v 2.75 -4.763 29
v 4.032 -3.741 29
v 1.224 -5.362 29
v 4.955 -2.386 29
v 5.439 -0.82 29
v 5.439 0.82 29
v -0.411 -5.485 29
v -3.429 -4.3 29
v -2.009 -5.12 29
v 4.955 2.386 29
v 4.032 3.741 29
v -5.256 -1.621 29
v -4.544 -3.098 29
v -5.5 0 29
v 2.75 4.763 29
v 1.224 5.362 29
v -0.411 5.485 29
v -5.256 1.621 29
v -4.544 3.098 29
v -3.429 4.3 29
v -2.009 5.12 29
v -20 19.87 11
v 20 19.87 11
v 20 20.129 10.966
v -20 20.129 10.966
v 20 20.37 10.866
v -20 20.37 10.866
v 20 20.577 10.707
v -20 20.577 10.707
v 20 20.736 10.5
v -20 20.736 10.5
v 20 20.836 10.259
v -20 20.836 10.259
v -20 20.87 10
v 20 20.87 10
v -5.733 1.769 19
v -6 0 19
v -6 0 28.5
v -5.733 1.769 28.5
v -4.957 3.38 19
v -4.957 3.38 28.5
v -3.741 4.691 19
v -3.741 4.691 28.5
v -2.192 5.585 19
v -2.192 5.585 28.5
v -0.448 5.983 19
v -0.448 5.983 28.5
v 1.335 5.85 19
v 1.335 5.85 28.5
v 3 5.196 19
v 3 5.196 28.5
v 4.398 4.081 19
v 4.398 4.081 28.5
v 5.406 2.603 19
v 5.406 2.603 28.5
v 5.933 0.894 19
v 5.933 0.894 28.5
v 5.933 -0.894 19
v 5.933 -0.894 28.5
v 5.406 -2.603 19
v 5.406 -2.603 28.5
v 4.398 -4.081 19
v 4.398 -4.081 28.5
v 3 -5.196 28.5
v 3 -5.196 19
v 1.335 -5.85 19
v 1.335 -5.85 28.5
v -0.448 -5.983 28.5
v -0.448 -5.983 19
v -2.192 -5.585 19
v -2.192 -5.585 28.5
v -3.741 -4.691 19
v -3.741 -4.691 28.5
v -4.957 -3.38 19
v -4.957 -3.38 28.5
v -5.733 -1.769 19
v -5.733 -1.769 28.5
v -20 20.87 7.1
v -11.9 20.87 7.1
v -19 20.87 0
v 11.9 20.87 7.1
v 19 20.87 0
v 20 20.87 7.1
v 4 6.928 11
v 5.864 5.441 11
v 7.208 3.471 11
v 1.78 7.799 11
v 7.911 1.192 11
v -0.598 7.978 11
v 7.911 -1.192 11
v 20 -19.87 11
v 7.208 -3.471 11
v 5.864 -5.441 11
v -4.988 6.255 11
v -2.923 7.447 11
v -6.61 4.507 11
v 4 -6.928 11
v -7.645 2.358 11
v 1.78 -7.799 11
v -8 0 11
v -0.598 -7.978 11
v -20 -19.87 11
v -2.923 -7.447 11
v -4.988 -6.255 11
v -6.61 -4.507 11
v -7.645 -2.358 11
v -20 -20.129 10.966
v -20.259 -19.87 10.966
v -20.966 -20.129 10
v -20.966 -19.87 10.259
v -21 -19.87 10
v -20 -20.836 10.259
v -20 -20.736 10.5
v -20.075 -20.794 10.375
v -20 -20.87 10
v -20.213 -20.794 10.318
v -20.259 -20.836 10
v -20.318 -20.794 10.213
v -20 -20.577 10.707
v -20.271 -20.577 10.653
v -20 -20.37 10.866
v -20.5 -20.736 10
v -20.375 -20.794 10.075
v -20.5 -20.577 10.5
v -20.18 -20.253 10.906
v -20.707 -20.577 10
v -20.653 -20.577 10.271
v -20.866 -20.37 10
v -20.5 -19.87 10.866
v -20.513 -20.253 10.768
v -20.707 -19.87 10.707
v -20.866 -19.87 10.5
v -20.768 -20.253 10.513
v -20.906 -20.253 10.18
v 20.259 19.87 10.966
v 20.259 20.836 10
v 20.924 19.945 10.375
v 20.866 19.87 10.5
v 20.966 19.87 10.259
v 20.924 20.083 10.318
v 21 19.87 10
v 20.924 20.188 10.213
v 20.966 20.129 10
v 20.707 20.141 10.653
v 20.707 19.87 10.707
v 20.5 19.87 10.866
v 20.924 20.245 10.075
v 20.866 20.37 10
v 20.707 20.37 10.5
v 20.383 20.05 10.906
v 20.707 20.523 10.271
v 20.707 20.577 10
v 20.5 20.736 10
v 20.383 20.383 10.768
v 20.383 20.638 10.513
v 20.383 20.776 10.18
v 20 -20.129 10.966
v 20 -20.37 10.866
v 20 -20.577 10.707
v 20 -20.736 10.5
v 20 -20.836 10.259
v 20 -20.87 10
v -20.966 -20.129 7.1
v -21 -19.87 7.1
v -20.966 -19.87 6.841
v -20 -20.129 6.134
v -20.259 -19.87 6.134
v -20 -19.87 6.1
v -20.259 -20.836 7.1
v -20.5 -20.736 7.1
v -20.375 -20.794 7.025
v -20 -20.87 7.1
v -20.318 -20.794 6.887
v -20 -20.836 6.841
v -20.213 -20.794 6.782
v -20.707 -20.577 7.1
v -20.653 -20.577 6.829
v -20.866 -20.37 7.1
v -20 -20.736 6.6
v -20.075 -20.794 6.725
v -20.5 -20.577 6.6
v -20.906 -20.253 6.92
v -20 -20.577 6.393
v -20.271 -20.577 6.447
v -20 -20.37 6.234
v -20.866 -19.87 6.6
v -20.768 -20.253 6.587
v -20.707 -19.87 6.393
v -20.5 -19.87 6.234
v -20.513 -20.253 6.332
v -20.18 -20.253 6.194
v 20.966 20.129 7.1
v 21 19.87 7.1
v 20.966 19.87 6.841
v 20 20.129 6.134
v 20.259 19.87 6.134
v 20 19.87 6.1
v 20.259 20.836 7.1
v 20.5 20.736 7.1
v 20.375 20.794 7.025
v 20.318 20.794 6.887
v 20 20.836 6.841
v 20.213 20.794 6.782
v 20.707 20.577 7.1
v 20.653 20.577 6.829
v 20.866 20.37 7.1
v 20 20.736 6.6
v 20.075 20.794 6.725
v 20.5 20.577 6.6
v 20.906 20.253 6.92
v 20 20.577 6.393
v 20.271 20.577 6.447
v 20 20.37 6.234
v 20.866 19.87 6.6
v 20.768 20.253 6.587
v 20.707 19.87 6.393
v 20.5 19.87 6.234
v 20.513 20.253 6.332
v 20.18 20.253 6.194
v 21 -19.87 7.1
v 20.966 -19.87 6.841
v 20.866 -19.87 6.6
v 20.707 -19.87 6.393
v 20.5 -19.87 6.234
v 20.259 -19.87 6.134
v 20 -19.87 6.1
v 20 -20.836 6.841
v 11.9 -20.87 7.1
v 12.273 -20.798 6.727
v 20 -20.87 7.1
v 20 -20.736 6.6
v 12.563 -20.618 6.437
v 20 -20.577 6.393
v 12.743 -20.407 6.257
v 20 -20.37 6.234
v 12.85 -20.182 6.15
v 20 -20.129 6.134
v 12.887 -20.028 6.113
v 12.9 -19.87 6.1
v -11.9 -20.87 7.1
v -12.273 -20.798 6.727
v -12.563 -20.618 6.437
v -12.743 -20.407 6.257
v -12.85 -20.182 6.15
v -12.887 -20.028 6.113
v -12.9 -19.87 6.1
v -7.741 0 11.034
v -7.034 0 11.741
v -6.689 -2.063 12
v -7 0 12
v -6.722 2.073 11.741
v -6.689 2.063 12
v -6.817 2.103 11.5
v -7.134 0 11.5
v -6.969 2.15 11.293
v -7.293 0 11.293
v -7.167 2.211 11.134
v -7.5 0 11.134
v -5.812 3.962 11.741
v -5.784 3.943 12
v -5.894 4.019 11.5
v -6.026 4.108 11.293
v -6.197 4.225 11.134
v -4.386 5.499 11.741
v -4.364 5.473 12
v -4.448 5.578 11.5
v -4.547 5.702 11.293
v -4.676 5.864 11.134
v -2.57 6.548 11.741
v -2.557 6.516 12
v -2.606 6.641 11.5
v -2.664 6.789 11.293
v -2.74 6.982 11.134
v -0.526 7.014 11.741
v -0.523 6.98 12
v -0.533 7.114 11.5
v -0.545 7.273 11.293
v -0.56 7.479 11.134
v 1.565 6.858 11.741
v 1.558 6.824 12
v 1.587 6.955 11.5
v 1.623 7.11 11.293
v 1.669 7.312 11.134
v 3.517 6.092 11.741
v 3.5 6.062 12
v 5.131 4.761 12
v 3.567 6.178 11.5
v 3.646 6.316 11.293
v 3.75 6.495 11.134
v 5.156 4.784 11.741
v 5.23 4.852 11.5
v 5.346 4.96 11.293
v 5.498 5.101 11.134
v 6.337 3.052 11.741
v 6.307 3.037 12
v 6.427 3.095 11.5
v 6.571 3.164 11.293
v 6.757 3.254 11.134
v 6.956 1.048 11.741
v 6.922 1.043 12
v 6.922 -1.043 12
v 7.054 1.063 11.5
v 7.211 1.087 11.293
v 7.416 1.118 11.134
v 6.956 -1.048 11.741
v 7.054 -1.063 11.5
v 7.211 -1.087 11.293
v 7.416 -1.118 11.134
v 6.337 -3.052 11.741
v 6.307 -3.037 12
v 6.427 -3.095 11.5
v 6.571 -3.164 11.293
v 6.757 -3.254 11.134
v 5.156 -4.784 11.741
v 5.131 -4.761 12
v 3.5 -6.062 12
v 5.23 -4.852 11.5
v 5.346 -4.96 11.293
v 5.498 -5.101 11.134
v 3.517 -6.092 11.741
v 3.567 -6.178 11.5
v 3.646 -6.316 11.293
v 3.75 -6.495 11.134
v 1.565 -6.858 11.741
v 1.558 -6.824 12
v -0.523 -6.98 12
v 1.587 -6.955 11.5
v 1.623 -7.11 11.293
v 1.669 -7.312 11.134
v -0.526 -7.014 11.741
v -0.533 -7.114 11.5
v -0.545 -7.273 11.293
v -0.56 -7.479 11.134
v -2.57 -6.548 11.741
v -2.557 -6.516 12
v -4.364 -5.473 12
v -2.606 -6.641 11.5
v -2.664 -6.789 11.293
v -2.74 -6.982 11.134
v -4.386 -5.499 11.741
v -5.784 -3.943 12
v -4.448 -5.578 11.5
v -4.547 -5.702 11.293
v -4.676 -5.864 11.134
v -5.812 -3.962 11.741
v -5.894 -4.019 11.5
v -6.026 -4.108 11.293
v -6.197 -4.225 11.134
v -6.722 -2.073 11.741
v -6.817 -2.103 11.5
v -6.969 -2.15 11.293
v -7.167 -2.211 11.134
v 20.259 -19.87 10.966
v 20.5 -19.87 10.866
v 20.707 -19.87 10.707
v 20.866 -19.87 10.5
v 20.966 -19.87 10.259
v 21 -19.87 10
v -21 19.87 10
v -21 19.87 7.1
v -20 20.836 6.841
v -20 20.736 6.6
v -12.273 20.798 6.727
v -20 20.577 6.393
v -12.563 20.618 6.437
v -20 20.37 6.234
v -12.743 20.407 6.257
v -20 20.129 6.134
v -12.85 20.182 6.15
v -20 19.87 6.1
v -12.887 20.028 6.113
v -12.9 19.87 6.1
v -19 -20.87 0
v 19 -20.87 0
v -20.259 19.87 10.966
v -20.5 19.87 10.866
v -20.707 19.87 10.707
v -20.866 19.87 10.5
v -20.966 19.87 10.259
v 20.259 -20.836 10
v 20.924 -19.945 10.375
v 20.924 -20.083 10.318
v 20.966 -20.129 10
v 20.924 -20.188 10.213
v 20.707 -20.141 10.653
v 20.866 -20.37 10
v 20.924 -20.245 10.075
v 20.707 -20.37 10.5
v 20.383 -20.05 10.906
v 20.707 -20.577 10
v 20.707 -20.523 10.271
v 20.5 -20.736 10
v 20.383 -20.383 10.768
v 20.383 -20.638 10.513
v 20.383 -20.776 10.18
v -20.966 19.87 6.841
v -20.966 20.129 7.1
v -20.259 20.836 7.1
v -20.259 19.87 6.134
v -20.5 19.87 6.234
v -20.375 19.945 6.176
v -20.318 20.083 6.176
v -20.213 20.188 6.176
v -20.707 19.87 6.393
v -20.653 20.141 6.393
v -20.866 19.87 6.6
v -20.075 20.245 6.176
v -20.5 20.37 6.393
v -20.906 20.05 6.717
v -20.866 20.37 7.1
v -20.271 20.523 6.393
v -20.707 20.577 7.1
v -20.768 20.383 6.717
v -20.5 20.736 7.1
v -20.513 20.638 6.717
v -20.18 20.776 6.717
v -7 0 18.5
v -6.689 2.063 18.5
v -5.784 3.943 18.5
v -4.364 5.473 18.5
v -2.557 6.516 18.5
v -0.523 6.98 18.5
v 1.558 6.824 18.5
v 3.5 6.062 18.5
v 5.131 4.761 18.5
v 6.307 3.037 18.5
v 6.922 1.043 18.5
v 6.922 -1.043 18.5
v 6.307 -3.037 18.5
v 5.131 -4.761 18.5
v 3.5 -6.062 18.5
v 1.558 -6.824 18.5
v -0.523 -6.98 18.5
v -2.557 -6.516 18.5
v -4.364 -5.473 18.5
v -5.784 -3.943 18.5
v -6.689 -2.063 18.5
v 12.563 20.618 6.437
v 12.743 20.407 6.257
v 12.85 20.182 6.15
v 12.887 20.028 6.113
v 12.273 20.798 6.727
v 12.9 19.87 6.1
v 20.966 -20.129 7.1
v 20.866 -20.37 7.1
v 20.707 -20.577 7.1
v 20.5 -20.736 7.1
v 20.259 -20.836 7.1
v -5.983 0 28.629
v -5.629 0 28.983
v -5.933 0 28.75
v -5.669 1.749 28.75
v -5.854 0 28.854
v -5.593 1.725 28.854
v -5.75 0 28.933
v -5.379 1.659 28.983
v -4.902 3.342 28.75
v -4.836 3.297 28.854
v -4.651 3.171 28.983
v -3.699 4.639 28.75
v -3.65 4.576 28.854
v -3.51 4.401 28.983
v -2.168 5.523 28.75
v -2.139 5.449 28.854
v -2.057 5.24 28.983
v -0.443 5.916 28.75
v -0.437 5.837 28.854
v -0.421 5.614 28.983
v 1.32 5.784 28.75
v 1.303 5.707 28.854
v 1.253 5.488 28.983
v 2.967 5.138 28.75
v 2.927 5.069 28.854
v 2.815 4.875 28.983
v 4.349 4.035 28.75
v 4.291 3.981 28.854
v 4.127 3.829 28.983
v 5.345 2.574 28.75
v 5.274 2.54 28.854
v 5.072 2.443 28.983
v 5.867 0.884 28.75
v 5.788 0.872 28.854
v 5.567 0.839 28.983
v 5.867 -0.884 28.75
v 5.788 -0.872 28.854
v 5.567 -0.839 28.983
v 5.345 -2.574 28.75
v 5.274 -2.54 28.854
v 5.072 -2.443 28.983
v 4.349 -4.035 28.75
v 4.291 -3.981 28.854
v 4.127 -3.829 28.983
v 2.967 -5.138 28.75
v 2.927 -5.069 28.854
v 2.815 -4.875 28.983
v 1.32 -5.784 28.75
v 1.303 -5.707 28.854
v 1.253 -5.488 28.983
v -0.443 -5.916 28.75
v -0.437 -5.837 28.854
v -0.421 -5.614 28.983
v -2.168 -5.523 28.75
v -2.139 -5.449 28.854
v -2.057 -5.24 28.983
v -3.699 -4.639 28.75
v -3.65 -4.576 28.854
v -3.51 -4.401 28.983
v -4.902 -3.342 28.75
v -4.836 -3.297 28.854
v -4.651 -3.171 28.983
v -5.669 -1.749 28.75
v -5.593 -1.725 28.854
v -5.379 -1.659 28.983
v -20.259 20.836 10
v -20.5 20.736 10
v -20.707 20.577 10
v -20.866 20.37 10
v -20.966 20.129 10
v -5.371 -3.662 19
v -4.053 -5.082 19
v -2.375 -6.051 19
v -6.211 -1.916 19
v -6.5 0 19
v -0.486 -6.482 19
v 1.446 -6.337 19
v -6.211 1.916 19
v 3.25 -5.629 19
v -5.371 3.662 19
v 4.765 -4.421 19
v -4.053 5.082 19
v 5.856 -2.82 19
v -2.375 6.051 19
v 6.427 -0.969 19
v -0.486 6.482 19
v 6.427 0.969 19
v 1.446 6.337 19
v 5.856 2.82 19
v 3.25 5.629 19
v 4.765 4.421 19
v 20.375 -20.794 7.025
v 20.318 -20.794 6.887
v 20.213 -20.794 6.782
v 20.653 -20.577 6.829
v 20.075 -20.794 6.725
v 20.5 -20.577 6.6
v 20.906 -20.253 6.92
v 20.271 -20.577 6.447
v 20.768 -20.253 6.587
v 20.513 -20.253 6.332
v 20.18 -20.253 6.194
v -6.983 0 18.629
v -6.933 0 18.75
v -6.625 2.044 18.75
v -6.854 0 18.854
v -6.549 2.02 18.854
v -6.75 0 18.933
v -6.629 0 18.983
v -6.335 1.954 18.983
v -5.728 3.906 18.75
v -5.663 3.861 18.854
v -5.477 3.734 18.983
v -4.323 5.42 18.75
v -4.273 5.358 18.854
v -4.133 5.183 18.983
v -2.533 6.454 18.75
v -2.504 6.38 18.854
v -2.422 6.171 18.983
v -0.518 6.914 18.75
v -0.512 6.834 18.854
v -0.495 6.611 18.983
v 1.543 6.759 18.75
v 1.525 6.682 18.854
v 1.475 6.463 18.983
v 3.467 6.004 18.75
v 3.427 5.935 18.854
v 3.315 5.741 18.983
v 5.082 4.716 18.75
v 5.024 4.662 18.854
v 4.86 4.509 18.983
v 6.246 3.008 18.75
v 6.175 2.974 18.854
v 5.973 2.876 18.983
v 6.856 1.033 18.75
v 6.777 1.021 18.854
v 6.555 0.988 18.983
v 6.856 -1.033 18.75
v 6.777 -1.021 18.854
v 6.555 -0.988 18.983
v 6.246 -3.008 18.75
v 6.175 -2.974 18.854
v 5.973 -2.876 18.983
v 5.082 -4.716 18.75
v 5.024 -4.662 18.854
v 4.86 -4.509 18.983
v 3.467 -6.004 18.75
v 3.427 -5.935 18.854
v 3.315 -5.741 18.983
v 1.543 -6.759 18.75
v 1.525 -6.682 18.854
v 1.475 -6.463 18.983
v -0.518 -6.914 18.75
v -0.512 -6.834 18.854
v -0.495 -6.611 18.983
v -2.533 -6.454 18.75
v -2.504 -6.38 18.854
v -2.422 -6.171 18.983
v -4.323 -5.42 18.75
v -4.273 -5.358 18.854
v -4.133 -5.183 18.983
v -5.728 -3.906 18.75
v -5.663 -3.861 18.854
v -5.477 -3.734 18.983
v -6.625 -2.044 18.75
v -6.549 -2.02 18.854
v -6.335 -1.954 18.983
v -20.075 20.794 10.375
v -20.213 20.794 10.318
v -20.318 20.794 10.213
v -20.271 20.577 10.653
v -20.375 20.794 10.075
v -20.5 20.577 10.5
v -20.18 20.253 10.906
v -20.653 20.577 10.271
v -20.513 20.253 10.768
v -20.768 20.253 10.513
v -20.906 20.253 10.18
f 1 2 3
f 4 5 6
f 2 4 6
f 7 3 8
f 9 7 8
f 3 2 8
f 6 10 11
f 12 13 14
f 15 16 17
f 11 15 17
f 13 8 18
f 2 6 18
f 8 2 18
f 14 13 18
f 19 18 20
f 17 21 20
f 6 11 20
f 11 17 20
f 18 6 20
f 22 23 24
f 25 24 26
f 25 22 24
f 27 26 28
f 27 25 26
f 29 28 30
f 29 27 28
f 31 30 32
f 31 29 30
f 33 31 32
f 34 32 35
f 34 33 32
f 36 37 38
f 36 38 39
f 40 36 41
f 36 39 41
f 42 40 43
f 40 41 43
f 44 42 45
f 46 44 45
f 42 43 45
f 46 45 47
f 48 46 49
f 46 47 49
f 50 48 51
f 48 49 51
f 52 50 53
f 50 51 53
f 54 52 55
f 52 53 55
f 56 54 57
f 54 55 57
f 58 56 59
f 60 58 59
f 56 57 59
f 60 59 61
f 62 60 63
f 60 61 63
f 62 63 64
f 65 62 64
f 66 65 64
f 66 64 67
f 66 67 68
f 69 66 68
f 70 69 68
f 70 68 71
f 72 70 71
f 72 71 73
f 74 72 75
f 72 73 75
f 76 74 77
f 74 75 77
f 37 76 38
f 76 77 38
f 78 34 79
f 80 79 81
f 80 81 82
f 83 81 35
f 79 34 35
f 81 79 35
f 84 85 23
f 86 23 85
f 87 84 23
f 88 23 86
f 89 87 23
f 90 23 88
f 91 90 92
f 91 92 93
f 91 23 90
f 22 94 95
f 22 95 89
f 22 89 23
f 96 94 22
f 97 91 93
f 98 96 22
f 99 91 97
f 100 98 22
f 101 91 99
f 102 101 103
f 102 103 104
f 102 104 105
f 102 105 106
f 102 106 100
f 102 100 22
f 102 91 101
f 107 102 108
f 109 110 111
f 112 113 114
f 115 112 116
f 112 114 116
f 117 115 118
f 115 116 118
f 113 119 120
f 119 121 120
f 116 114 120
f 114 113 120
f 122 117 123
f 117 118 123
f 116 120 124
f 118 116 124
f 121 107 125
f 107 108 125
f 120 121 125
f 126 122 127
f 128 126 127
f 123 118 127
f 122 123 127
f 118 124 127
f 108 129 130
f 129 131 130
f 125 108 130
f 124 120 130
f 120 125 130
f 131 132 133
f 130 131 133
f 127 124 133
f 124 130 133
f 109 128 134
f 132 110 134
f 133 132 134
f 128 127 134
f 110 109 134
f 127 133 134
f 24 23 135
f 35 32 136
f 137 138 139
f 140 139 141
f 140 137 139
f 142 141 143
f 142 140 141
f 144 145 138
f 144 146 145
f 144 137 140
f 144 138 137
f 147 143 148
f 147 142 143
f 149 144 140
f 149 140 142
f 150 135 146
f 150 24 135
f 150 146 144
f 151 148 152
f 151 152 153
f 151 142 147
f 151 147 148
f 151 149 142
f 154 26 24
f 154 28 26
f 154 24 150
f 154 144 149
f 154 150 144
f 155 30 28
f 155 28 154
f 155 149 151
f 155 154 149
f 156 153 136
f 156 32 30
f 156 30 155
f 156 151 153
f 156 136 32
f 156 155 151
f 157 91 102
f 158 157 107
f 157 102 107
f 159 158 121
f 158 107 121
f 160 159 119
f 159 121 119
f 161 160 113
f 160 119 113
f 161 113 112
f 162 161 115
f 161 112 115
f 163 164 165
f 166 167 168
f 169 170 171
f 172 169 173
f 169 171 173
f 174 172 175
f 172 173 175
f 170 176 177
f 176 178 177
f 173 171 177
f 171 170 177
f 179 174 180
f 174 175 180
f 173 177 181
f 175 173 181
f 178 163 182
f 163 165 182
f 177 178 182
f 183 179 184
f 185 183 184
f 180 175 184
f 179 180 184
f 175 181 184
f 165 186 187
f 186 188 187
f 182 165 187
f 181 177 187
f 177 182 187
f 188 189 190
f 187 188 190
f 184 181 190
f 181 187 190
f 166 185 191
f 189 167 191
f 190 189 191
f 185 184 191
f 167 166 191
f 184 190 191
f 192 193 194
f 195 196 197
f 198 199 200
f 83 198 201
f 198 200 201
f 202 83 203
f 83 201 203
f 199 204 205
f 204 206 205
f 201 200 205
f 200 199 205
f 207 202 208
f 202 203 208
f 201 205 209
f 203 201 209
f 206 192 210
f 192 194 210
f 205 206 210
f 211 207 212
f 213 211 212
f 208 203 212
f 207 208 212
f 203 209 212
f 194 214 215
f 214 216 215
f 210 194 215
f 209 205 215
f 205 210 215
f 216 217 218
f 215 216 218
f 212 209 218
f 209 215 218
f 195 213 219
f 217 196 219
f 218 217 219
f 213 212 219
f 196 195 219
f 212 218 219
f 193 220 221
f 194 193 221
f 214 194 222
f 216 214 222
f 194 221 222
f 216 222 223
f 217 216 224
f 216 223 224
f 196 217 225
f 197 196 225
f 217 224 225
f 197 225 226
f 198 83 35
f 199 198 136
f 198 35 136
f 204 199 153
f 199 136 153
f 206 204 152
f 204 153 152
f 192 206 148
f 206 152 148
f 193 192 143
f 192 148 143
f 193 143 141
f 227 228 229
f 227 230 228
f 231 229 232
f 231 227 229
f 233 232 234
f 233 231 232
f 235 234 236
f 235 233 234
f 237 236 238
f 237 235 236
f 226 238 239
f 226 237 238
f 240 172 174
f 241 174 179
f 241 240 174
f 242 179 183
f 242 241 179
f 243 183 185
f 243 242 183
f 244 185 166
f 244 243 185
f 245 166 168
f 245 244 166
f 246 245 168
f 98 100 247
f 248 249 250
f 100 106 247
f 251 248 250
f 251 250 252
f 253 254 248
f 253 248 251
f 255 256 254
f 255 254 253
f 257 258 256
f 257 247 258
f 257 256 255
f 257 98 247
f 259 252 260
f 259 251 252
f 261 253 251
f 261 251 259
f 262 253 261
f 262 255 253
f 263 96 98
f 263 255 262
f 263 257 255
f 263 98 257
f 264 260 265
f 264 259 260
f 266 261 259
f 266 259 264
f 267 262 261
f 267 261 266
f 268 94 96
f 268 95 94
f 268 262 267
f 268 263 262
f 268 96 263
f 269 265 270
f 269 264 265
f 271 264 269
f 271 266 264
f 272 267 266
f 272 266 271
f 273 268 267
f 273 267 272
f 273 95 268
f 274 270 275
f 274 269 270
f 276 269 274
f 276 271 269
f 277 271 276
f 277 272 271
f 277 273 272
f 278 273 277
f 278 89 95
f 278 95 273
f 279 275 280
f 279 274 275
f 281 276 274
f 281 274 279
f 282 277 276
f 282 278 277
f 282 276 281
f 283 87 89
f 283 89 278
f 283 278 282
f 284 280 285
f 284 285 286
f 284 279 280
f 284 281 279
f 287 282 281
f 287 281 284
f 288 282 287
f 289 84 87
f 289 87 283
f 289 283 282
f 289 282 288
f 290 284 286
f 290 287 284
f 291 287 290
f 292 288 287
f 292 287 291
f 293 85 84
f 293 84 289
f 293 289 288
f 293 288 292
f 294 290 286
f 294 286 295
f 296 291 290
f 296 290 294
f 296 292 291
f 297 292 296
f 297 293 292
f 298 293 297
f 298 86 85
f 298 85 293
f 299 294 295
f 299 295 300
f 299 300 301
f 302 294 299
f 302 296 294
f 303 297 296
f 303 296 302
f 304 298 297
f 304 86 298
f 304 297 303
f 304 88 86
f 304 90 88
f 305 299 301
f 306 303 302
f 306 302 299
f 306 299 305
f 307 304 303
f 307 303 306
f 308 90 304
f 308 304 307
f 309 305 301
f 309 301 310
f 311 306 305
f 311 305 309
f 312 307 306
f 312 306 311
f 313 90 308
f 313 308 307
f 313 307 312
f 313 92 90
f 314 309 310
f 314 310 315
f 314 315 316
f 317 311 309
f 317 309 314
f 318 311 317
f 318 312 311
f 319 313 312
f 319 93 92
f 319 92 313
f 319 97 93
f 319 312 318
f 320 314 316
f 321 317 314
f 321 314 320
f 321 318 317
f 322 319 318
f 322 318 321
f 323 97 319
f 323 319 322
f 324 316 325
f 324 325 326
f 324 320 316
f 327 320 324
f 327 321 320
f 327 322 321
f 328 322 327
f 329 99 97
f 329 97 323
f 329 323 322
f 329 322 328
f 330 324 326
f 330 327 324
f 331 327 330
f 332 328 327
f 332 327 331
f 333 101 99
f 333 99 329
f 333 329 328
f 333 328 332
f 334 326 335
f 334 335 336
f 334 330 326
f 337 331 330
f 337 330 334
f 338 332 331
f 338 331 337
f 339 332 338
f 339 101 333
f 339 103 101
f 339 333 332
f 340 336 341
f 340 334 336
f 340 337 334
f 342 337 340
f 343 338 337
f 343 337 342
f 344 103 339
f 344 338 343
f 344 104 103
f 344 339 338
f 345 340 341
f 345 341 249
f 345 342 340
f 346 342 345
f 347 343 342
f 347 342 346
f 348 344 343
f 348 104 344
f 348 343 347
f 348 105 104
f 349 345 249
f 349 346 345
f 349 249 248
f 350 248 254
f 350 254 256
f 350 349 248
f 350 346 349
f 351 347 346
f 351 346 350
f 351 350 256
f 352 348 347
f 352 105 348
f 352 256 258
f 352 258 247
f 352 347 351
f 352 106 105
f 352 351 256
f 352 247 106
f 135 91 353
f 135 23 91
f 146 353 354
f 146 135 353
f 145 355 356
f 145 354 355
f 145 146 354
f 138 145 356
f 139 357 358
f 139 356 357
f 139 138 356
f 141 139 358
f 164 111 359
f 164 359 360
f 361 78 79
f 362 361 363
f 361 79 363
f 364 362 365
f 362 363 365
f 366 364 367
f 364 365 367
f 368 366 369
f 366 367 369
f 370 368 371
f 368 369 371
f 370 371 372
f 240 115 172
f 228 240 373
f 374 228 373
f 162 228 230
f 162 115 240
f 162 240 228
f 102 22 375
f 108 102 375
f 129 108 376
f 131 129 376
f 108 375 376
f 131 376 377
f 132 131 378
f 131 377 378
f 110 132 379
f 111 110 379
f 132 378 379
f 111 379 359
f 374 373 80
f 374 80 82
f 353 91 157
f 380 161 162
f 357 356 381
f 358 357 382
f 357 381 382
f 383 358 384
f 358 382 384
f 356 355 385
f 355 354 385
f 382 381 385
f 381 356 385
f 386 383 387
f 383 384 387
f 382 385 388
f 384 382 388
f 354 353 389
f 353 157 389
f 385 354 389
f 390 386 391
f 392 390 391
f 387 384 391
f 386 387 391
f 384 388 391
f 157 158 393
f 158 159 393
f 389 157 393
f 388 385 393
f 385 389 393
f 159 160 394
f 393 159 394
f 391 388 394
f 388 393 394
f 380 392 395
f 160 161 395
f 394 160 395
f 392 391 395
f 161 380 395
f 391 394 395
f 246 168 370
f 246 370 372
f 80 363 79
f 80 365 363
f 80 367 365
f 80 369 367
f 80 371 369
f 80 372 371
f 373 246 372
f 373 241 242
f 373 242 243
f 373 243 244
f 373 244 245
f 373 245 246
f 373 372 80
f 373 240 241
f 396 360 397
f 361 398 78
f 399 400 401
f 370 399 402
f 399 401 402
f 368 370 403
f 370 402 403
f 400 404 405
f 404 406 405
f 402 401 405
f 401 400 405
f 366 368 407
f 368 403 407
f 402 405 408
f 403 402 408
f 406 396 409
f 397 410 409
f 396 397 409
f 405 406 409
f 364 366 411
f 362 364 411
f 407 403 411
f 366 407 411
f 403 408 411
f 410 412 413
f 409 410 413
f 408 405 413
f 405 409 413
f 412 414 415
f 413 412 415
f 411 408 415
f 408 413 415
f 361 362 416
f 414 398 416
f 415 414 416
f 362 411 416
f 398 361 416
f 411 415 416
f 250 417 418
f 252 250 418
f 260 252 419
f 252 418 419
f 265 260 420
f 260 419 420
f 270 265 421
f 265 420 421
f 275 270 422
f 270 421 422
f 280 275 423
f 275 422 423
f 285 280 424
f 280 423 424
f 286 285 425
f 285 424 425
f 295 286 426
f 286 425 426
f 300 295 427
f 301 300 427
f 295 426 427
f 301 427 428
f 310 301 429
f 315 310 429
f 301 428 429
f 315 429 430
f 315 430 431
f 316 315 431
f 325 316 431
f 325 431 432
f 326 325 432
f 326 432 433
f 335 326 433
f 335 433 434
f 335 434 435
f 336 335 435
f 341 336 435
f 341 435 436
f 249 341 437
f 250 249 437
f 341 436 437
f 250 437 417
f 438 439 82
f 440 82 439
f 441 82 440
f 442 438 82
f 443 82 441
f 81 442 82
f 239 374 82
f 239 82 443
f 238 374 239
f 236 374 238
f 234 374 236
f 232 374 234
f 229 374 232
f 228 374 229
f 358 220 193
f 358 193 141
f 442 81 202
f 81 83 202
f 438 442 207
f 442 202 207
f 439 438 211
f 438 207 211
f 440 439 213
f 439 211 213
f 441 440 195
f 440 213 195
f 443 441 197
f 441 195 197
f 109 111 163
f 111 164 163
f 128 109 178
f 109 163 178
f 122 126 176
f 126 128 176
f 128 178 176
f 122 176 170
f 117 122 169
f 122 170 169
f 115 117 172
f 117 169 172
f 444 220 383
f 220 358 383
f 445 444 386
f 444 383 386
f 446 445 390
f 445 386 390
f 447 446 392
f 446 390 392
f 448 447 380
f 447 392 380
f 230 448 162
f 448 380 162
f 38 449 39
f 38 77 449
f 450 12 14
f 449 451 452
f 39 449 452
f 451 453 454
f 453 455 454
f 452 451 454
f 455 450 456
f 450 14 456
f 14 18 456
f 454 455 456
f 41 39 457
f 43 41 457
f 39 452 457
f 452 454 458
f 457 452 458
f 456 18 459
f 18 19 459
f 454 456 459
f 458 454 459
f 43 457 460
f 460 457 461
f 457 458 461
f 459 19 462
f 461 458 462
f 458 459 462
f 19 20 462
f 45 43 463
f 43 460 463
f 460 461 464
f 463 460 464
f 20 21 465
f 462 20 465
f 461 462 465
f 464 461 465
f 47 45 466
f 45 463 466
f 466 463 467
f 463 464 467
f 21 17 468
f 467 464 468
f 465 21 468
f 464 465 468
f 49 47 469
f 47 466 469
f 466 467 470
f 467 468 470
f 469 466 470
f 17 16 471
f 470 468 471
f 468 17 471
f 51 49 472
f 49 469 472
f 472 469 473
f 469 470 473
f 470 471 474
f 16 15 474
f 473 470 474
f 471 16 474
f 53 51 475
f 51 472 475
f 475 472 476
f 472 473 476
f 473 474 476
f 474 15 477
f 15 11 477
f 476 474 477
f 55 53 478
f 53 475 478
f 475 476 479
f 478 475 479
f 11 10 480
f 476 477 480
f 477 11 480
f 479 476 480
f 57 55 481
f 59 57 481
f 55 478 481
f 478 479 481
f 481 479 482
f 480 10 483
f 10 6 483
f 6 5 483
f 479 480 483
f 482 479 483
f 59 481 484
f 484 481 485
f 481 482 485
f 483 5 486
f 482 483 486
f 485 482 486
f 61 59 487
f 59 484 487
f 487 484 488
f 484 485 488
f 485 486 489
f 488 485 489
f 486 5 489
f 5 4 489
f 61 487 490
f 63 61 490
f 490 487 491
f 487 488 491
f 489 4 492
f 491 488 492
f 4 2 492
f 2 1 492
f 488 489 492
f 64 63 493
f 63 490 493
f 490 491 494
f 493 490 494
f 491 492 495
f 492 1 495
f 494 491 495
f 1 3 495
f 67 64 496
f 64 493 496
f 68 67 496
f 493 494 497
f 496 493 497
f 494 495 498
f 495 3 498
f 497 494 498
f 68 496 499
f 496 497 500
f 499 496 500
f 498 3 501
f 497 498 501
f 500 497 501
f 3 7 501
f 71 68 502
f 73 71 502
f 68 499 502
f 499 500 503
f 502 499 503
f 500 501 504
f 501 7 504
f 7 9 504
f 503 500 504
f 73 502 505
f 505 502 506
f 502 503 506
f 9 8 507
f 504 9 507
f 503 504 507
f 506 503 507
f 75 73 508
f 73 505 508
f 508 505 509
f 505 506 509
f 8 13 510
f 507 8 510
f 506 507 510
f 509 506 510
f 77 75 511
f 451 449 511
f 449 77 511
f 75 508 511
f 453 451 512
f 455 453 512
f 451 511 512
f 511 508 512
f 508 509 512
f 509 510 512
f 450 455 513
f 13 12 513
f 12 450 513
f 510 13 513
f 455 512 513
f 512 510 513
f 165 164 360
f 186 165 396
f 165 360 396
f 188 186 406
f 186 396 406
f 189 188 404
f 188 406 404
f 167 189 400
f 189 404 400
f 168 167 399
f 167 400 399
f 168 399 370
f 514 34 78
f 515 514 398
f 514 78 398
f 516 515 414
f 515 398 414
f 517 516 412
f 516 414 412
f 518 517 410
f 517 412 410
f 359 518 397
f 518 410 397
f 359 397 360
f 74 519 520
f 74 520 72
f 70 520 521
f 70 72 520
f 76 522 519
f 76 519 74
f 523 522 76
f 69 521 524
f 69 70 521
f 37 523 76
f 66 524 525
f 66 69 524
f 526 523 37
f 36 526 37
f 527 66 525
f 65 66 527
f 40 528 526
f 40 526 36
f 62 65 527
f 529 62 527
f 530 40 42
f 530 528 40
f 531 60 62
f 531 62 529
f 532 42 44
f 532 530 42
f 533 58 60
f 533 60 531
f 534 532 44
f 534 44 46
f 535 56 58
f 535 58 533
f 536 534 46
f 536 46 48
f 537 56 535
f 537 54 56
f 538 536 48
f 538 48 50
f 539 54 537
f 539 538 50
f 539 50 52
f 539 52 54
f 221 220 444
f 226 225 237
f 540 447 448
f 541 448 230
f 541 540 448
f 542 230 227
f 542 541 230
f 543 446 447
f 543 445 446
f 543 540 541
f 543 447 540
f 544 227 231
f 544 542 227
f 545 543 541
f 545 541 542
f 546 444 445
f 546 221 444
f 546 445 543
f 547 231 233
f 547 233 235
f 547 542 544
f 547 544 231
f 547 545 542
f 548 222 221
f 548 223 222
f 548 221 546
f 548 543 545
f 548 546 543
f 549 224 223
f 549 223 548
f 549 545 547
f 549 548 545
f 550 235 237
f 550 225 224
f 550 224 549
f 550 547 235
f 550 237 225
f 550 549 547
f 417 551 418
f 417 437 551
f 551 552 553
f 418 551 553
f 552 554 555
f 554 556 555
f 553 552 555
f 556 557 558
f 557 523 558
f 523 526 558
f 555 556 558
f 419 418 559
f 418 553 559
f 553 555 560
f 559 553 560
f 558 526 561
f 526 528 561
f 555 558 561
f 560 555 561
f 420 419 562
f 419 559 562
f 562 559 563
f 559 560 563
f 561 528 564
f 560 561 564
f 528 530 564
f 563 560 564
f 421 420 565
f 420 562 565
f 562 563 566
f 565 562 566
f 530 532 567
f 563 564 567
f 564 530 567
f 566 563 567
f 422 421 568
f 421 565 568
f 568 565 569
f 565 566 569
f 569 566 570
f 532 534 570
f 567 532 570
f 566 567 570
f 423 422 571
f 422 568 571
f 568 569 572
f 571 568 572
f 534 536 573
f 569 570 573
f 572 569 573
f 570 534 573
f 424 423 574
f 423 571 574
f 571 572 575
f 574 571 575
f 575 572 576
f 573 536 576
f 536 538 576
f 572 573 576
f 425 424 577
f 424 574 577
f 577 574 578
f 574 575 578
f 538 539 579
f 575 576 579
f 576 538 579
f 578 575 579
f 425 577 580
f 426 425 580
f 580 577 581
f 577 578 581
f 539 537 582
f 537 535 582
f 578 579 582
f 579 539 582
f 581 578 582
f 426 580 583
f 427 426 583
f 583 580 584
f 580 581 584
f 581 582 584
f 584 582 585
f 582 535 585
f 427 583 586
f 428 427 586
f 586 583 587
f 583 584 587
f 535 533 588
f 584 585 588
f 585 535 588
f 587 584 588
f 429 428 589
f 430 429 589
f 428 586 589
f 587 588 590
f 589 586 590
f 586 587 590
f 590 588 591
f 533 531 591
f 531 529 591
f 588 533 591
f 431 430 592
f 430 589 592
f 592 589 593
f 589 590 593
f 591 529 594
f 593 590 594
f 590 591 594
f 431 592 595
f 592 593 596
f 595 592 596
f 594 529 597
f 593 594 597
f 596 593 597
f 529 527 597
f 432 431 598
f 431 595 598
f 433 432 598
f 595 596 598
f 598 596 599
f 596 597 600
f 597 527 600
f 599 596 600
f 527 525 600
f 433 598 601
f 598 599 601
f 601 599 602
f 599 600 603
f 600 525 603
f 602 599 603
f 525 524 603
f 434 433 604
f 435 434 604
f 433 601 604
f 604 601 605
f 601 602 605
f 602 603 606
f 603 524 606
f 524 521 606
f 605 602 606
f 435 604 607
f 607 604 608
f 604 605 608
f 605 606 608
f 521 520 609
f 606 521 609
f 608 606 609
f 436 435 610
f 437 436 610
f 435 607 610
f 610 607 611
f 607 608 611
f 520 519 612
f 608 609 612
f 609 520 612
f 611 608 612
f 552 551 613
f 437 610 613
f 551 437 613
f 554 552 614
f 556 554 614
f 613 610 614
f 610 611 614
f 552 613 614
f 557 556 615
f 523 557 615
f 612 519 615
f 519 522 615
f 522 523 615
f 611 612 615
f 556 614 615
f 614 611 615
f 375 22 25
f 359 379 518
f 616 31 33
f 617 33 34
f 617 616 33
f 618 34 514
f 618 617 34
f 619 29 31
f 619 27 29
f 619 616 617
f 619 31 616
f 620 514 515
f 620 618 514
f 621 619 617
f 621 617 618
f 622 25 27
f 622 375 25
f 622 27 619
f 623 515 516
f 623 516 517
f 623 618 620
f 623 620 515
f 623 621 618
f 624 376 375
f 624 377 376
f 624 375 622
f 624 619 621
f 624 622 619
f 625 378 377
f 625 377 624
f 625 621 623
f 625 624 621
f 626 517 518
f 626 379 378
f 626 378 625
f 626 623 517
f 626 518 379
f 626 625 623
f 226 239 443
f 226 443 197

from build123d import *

# Parameters (mm, degrees)
F1_DEPTH = 20.87
F2_W     = 6
F2_H     = 8
F2_W_2   = 1
F2_H_2   = 10
F4_R     = 0.5
F5_R     = 1


with BuildPart() as f1:
    # F0 (on Front) → F1 (new body, symmetric)
    with BuildSketch(Plane.XZ):
        Polygon((-21, 6.1), (-12.9, 6.1), (0, 6.1), (0, 11), (-6, 11), (-7, 11), (-21, 11), align=None)
        Polygon((0, 11), (0, 6.1), (12.9, 6.1), (21, 6.1), (21, 11), (7, 11), (6, 11), align=None)
        Polygon((-12.9, 6.1), (-19, 0), (0, 0), (19, 0), (12.9, 6.1), (0, 6.1), align=None)
    extrude(amount=F1_DEPTH, both=True)

    # F2 (on Front) → F3 (revolve)
    with BuildSketch(Plane.XZ):
        with Locations((-3, 15)):
            Rectangle(F2_W, F2_H)
        with Locations((-6.5, 15)):
            Rectangle(F2_W_2, F2_H)
        with Locations((-3, 24)):
            Rectangle(F2_W, F2_H_2)
    revolve(axis=Axis((0, 0, 20), (0, 0, -1)))

    # F4
    f4_edges = [f1.edges().sort_by_distance(p)[0] for p in [
        (6, 0, 29),
        (7, 0, 19),
    ]]
    fillet(f4_edges, radius=F4_R)

    # F5
    f5_edges = [f1.edges().sort_by_distance(p)[0] for p in [
        (-21, 0, 11),
        (0, -20.87, 11),
        (0, 20.87, 11),
        (21, 0, 11),
        (7, 0, 11),
        (-21, 20.87, 8.55),
        (-21, 0, 6.1),
        (-21, -20.87, 8.55),
        (21, 0, 6.1),
        (21, 20.87, 8.55),
        (21, -20.87, 8.55),
        (16.95, 20.87, 6.1),
        (-16.95, 20.87, 6.1),
        (-16.95, -20.87, 6.1),
        (16.95, -20.87, 6.1),
    ]]
    fillet(f5_edges, radius=F5_R)


solid = f1.part
